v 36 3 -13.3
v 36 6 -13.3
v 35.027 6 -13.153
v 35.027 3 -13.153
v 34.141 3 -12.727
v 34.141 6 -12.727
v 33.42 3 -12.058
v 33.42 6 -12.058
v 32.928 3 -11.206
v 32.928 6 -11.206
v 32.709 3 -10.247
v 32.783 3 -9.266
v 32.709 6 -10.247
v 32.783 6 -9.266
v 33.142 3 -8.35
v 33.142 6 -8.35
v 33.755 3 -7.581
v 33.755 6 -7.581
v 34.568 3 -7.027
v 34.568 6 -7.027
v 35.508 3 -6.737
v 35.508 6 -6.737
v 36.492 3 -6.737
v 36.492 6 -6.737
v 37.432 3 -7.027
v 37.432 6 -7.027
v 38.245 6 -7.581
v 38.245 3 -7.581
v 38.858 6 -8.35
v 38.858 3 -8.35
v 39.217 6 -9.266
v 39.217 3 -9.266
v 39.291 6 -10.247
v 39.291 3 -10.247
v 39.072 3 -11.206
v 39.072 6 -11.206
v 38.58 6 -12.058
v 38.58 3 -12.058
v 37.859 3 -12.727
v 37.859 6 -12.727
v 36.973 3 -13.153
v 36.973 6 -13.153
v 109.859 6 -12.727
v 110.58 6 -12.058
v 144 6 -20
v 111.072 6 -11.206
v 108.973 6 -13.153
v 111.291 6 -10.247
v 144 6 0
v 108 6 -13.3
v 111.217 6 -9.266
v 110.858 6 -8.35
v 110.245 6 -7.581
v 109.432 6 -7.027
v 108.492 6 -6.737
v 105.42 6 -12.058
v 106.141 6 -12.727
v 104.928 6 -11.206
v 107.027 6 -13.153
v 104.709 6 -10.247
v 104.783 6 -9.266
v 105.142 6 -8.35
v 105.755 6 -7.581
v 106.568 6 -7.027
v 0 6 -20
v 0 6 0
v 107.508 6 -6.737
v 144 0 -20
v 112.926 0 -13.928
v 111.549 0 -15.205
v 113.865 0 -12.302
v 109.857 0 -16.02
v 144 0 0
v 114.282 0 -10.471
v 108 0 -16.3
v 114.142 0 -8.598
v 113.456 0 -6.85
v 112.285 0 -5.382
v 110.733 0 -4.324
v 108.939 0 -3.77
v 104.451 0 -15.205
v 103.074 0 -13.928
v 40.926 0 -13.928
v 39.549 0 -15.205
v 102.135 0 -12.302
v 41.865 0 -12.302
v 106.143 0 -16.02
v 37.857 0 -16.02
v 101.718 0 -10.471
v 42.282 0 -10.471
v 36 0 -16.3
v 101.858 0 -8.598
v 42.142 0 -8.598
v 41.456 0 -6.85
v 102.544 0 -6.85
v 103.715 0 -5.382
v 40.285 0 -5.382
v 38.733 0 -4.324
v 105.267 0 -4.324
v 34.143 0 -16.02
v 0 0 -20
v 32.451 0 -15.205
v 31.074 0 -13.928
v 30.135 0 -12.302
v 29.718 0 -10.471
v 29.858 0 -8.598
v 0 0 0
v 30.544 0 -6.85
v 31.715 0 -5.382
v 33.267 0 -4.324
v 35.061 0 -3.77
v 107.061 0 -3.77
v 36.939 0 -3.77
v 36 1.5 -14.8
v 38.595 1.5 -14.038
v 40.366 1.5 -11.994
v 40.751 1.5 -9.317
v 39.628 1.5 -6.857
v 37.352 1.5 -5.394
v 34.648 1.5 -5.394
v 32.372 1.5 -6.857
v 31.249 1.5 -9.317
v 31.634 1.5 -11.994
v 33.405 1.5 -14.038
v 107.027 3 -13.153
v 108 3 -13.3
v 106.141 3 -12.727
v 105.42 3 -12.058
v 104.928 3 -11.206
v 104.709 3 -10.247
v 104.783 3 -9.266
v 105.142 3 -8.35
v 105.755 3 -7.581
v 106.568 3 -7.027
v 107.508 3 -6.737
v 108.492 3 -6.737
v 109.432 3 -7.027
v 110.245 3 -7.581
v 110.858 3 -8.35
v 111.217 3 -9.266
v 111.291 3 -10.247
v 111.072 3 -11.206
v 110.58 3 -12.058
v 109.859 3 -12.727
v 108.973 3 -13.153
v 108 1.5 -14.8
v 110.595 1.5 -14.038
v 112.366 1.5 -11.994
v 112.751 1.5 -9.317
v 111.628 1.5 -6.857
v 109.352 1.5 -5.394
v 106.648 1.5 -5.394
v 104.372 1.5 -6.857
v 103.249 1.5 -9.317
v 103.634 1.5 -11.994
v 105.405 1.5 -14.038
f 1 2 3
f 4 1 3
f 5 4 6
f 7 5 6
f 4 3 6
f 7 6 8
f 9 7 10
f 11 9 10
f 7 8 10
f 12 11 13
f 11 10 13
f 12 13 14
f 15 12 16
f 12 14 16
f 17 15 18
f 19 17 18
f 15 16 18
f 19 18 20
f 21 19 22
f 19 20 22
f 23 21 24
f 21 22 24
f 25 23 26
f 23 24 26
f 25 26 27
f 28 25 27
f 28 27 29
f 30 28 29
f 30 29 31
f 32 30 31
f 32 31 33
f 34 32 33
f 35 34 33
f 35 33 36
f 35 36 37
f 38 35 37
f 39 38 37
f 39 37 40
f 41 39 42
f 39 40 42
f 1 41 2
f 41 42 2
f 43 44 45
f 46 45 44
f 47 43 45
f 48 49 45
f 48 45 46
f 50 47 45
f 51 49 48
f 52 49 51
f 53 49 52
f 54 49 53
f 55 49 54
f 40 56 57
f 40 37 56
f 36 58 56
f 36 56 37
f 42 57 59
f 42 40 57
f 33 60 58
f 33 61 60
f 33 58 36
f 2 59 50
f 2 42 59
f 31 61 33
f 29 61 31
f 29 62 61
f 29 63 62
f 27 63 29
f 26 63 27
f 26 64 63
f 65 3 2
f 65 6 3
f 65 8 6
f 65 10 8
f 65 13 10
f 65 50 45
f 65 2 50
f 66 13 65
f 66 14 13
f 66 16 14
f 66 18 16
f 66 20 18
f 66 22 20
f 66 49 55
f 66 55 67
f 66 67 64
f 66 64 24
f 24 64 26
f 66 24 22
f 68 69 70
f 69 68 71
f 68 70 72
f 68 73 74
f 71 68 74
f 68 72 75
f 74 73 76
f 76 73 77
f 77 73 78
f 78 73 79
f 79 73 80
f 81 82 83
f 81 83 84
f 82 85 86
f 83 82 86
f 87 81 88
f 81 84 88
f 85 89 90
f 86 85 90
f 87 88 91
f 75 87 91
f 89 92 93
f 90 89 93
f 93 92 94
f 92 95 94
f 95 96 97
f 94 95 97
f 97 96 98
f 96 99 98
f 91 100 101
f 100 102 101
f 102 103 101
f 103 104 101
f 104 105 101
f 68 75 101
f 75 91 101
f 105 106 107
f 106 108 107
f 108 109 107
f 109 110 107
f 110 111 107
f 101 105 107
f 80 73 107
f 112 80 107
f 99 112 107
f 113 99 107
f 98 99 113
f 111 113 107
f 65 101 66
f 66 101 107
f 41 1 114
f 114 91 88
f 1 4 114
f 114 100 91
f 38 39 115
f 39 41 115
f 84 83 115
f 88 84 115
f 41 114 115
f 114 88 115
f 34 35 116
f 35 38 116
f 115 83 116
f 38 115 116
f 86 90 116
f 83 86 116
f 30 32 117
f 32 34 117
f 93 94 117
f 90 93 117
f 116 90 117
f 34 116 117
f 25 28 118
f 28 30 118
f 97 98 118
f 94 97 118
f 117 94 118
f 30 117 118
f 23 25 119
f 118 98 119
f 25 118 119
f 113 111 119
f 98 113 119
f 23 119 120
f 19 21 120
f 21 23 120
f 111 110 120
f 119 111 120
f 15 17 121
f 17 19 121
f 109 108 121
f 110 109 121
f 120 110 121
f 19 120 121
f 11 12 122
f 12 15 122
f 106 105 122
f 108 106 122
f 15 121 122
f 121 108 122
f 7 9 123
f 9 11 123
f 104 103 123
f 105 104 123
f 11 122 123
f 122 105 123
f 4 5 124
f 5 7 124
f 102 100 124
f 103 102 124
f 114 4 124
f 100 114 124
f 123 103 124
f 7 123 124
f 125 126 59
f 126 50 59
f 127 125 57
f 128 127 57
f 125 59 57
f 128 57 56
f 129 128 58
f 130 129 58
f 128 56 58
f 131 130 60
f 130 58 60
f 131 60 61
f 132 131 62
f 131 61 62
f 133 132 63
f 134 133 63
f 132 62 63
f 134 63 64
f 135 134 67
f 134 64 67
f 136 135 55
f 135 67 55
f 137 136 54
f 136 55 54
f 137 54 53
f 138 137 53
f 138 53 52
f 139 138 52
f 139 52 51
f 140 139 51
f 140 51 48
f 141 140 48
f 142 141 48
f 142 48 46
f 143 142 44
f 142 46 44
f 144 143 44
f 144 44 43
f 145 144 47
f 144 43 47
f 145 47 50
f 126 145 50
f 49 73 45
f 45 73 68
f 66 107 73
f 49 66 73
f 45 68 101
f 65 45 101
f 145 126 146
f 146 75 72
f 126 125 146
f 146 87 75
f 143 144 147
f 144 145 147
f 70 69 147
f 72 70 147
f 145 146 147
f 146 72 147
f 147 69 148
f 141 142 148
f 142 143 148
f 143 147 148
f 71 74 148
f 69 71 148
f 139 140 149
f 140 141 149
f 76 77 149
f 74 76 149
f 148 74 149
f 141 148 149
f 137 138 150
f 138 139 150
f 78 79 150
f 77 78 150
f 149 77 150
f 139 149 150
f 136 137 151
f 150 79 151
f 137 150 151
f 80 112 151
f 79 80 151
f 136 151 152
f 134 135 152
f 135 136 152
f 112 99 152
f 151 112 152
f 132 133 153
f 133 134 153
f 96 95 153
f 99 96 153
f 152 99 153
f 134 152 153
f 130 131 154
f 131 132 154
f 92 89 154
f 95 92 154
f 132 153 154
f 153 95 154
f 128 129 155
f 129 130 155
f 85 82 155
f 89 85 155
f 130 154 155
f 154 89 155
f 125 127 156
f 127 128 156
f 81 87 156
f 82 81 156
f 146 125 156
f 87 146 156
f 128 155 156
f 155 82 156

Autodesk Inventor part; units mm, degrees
ref_plane "YZ Plane" through (0, 0, 0) normal (1, 0, 0) x (0, 1, 0)
ref_plane "XZ Plane" through (0, 0, 0) normal (0, 1, 0) x (-1, 0, 0)
ref_plane "XY Plane" through (0, 0, 0) normal (0, 0, 1) x (1, 0, 0)
sketch "Sketch1" plane through (0, 0, 0) normal (0, 1, 0) x (-1, 0, 0)
  line L0 (0, 0) -> (-144, 0)
  line L1 (-144, 0) -> (-144, -20)
  line L2 (-144, -20) -> (0, -20)
  line L3 (0, -20) -> (0, 0)
  point P0 (-36, -10)
  point P1 (-108, -10)
  dimension "d0" = 144
  dimension "d1" = 20
extrude "Extrusion1" add sketch "Sketch1" along normal blind 6
hole "Hole1" at (36, 0, -10) at (108, 0, -10) direction (0, 1, 0) diameter 6.6 end through all countersink diameter 12.6 countersink angle 90
properties part number "chapa_base" material "Iron, Cast"
